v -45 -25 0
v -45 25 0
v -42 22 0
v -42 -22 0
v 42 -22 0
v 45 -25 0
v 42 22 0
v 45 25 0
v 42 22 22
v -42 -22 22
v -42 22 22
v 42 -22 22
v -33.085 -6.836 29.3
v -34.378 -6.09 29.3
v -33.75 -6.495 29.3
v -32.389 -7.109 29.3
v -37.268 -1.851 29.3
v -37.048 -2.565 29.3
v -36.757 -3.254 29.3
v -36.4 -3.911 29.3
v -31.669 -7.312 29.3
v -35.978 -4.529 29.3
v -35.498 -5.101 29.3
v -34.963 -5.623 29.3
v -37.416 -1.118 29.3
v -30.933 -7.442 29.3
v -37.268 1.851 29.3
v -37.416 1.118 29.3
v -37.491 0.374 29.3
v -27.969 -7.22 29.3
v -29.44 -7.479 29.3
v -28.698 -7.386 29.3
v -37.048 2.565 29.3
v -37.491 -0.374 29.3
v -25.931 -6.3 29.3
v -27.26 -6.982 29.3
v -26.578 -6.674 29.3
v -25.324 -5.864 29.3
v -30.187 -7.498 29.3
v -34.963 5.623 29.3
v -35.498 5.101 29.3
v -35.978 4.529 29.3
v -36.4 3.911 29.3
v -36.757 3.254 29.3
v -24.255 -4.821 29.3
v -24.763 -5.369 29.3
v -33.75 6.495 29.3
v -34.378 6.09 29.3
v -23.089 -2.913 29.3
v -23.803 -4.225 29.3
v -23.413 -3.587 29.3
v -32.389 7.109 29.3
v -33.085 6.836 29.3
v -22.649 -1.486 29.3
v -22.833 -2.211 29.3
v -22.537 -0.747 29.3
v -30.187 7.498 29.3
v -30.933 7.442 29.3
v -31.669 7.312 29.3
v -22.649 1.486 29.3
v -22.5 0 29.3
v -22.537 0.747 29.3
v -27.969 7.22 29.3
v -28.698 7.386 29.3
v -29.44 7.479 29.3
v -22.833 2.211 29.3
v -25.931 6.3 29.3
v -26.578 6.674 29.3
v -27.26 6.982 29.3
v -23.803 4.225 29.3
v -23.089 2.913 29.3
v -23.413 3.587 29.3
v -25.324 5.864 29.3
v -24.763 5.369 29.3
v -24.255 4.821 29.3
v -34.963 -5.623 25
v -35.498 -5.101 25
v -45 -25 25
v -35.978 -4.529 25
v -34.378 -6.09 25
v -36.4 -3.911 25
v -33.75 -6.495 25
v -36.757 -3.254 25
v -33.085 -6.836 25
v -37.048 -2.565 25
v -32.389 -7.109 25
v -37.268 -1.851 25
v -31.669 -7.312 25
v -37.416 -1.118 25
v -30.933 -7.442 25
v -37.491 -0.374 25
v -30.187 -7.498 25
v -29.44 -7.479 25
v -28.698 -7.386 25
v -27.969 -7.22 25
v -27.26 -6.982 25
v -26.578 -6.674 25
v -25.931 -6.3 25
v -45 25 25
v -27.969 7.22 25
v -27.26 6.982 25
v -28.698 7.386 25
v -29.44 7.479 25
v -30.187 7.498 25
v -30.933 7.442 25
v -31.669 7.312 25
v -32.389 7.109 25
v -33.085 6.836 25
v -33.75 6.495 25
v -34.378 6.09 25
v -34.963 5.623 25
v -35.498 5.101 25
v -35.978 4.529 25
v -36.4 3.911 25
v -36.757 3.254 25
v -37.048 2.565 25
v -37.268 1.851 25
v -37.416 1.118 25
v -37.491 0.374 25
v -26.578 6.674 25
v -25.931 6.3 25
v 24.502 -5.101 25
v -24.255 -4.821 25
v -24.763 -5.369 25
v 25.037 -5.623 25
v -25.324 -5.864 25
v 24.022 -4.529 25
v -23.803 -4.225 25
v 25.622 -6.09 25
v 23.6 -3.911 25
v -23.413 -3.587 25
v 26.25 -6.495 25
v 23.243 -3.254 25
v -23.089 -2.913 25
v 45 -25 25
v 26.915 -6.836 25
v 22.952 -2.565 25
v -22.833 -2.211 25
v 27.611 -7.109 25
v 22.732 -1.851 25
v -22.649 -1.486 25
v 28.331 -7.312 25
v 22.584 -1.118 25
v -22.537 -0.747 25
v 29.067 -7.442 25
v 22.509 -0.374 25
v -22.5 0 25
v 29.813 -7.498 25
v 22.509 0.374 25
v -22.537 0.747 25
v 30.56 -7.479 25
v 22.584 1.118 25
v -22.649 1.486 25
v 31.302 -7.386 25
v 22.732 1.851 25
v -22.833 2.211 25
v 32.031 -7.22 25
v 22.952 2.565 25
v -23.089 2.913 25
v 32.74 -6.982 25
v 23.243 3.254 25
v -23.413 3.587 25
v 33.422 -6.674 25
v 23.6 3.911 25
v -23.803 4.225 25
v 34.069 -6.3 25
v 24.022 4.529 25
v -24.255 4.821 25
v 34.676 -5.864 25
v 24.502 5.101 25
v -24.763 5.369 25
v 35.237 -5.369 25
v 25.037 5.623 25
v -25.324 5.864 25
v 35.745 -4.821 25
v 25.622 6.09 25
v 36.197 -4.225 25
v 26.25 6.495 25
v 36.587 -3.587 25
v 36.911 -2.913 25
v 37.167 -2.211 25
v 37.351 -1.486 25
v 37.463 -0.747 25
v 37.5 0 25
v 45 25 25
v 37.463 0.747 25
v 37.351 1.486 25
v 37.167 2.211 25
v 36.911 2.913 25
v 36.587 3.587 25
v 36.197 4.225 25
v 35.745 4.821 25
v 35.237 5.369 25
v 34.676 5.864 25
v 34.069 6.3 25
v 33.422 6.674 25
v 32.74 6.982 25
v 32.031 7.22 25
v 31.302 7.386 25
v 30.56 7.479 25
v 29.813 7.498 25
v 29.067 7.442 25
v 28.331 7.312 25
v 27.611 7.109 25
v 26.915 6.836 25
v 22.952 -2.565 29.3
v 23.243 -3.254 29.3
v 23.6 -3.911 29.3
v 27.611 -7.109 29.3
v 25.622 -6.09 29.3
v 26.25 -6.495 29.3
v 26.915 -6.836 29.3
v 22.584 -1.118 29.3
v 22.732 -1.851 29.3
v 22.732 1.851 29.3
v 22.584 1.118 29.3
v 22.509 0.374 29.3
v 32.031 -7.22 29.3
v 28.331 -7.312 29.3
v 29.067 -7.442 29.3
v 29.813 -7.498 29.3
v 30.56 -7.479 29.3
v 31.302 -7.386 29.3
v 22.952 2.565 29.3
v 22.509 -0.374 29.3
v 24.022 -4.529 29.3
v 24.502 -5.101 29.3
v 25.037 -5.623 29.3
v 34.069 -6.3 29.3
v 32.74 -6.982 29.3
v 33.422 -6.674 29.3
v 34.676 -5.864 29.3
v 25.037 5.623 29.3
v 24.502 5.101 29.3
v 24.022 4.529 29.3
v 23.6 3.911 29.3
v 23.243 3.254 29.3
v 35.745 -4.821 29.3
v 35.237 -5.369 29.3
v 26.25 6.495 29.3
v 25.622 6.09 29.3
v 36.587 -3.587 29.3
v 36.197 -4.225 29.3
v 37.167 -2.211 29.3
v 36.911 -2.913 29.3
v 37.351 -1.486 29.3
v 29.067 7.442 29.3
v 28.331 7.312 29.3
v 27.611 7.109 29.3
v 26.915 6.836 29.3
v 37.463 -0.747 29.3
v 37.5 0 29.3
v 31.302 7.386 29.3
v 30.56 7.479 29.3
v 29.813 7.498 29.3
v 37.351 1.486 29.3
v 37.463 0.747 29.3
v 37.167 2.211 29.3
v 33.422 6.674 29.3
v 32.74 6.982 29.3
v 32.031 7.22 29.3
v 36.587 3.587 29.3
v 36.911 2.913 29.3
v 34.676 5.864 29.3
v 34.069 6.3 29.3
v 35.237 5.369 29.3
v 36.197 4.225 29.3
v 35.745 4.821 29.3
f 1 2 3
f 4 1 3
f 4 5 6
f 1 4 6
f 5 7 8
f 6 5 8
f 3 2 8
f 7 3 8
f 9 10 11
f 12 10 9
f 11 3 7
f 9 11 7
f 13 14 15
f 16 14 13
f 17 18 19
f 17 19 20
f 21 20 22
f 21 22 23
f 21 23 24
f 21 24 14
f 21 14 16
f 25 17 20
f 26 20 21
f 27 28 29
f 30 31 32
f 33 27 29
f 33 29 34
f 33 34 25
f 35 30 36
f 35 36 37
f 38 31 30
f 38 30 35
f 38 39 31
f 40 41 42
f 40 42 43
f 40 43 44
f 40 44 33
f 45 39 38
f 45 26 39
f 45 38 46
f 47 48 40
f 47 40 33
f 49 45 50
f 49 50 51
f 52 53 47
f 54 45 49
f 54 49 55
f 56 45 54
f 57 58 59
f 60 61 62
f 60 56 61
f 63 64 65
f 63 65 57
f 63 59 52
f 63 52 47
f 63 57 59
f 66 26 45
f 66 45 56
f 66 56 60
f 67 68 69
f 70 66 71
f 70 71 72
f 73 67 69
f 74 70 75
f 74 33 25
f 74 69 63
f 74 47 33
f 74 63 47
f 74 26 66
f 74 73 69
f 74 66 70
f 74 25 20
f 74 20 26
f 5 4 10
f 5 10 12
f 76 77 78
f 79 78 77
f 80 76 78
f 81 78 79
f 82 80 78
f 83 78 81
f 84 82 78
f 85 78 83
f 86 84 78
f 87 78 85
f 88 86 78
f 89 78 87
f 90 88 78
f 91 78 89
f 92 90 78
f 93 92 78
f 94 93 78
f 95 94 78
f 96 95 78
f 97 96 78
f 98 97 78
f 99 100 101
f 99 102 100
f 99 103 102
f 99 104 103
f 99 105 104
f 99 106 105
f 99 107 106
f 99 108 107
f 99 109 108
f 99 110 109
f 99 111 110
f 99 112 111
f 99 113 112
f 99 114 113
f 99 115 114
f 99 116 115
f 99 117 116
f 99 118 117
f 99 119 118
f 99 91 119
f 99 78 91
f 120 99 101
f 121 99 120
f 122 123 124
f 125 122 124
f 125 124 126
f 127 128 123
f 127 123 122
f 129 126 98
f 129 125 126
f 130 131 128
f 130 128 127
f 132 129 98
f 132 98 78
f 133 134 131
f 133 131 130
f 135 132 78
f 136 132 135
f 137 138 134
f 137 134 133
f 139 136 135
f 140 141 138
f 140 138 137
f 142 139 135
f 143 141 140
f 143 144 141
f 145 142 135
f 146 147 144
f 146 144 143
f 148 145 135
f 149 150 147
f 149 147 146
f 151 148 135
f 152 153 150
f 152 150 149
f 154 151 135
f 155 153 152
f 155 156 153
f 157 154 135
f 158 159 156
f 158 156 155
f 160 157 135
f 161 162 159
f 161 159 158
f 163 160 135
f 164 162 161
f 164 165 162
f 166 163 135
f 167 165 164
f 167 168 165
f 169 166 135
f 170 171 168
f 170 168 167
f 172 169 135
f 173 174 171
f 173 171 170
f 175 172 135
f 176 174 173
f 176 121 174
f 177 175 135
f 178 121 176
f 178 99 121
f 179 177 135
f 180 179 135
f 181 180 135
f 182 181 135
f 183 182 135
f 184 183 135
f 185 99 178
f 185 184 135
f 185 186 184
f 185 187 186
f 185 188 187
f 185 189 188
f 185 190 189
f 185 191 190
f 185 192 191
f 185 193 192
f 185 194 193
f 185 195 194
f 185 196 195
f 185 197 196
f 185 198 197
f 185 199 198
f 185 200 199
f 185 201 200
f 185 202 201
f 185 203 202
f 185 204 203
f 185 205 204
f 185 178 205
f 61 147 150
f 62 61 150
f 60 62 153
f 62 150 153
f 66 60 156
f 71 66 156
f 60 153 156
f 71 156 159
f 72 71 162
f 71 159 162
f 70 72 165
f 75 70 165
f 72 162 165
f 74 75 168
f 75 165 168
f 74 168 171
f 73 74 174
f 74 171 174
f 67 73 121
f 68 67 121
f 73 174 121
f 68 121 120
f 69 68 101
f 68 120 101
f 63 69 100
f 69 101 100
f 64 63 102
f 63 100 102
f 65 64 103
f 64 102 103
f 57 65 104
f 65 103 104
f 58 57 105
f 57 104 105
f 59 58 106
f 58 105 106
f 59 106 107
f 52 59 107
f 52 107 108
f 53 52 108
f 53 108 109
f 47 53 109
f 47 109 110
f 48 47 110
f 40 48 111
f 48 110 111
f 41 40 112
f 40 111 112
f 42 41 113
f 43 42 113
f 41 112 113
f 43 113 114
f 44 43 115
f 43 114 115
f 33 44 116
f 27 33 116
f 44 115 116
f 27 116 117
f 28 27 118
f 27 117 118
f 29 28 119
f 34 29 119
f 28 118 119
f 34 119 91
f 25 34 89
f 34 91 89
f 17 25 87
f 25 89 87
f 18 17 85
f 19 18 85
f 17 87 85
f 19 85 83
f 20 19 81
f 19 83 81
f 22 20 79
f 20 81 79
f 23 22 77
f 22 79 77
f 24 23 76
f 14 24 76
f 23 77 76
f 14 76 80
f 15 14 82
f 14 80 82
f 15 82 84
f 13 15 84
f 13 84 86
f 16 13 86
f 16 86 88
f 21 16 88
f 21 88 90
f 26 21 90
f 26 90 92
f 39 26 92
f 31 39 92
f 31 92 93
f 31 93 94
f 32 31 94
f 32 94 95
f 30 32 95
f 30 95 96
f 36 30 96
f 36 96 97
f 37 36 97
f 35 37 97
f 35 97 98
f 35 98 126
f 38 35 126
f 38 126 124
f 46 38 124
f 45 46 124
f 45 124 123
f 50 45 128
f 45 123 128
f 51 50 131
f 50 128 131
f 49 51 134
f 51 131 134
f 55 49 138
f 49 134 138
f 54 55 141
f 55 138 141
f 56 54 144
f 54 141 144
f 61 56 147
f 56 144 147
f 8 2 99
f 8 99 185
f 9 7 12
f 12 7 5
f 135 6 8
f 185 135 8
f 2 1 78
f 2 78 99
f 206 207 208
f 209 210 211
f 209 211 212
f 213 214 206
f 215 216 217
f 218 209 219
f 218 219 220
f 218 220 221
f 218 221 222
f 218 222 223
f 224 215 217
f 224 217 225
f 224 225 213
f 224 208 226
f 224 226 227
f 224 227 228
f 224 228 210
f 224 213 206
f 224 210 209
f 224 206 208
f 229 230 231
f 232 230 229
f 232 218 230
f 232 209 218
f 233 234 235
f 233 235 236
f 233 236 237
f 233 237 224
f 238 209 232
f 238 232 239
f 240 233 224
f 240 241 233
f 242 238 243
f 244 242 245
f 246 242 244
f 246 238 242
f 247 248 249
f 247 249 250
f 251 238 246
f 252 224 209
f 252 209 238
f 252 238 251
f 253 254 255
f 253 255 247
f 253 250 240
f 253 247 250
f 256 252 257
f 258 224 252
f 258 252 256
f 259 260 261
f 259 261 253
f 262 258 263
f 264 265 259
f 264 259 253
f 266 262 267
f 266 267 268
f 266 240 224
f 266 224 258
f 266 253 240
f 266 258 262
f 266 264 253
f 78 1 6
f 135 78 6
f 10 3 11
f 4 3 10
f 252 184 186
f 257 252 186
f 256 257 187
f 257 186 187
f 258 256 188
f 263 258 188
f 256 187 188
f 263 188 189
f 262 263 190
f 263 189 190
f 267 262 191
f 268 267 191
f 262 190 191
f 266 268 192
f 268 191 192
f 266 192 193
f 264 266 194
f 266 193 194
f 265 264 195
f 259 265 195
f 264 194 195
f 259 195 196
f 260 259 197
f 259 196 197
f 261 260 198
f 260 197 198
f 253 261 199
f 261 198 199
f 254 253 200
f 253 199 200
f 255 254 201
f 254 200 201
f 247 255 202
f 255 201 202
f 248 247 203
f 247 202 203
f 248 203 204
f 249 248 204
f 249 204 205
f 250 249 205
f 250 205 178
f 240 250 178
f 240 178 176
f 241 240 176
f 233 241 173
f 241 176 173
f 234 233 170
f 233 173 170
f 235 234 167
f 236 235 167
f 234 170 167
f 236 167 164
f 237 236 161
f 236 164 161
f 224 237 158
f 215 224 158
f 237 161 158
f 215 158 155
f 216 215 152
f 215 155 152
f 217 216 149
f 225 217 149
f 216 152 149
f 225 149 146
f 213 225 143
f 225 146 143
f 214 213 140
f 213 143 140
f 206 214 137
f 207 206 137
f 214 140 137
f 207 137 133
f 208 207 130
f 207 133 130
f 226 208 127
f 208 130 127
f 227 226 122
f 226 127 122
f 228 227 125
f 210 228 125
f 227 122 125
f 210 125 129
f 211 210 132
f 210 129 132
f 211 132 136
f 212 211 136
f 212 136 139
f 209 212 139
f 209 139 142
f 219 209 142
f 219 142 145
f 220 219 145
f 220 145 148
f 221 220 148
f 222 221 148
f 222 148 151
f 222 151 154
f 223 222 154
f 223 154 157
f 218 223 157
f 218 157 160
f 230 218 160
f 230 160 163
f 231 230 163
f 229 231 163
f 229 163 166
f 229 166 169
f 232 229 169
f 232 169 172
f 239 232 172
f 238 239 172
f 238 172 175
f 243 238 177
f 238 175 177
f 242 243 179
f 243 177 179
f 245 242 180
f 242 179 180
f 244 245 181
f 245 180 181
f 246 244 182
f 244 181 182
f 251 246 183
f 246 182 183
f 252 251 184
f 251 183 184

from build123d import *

# Parameters (mm, degrees)
F0_W     = 90
F0_H     = 50
F1_DEPTH = 25
F2_R     = 7.5
F3_DEPTH = 4.3
F4_W     = 84
F4_H     = 44
F5_DEPTH = 22


with BuildPart() as f1:
    # F0 (on Top) → F1 (new body)
    with BuildSketch(Plane.XY):
        Rectangle(F0_W, F0_H)
    extrude(amount=F1_DEPTH)

    # F2 (on face) → F3 (join)
    with BuildSketch(Plane.XY.offset(25)):
        with Locations((30, 0)):
            Circle(F2_R)
        with Locations((-30, 0)):
            Circle(F2_R)
    extrude(amount=F3_DEPTH)

    # F4 (on face) → F5 (cut)
    with BuildSketch(Plane(origin=(0, 0, 0), x_dir=(1, 0, 0), z_dir=(0, 0, -1))):
        Rectangle(F4_W, F4_H)
    extrude(amount=-F5_DEPTH, mode=Mode.SUBTRACT)


solid = f1.part
